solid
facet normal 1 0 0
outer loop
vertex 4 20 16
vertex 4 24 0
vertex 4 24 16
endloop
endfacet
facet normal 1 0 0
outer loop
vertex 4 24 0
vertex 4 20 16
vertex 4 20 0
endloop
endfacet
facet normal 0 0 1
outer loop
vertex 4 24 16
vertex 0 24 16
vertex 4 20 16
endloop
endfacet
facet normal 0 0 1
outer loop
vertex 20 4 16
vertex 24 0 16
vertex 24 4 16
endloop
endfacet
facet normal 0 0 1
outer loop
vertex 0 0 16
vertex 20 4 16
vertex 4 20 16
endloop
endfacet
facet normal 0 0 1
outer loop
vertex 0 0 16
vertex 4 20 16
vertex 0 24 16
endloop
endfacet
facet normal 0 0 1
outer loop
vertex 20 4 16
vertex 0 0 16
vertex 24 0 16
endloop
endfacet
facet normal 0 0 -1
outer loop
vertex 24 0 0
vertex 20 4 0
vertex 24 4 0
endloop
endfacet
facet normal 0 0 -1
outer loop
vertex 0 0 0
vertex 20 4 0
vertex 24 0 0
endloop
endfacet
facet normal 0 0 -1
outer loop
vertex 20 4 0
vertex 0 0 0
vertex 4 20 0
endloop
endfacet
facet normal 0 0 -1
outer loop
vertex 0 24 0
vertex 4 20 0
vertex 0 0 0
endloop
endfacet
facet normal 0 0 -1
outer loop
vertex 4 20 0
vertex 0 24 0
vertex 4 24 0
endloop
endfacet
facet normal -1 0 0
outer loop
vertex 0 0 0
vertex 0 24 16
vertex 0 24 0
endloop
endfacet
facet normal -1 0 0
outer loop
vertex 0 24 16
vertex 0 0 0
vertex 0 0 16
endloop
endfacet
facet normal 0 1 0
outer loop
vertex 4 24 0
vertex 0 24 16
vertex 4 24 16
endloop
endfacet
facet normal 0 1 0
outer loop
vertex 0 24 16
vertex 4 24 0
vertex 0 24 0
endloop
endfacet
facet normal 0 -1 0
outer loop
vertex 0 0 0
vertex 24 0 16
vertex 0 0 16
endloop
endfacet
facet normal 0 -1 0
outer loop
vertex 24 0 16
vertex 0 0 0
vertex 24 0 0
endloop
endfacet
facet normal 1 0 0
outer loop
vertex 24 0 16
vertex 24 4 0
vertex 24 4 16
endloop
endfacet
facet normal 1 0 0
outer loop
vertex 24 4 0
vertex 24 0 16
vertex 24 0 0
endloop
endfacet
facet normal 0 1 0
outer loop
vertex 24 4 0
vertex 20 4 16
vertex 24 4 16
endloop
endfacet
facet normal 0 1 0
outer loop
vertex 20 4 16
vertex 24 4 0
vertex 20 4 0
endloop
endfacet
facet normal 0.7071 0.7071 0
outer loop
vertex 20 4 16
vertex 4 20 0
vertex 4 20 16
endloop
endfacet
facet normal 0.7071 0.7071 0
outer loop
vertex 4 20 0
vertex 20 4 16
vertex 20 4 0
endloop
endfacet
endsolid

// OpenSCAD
// Gusset: a solid triangular fill at an inside corner between two
// perpendicular walls.
wall_t = 4; wall_len = 24; wall_h = 16; g = 16;

union() {
    // wall along Y
    cube([wall_t, wall_len, wall_h]);
    // wall along X (perpendicular, meeting at the inside corner)
    cube([wall_len, wall_t, wall_h]);
    // solid triangular gusset filling the inside corner, flush to both walls
    translate([wall_t, wall_t, 0])
    linear_extrude(height = wall_h)
    polygon(points = [[0, 0], [g, 0], [0, g]]);
}
